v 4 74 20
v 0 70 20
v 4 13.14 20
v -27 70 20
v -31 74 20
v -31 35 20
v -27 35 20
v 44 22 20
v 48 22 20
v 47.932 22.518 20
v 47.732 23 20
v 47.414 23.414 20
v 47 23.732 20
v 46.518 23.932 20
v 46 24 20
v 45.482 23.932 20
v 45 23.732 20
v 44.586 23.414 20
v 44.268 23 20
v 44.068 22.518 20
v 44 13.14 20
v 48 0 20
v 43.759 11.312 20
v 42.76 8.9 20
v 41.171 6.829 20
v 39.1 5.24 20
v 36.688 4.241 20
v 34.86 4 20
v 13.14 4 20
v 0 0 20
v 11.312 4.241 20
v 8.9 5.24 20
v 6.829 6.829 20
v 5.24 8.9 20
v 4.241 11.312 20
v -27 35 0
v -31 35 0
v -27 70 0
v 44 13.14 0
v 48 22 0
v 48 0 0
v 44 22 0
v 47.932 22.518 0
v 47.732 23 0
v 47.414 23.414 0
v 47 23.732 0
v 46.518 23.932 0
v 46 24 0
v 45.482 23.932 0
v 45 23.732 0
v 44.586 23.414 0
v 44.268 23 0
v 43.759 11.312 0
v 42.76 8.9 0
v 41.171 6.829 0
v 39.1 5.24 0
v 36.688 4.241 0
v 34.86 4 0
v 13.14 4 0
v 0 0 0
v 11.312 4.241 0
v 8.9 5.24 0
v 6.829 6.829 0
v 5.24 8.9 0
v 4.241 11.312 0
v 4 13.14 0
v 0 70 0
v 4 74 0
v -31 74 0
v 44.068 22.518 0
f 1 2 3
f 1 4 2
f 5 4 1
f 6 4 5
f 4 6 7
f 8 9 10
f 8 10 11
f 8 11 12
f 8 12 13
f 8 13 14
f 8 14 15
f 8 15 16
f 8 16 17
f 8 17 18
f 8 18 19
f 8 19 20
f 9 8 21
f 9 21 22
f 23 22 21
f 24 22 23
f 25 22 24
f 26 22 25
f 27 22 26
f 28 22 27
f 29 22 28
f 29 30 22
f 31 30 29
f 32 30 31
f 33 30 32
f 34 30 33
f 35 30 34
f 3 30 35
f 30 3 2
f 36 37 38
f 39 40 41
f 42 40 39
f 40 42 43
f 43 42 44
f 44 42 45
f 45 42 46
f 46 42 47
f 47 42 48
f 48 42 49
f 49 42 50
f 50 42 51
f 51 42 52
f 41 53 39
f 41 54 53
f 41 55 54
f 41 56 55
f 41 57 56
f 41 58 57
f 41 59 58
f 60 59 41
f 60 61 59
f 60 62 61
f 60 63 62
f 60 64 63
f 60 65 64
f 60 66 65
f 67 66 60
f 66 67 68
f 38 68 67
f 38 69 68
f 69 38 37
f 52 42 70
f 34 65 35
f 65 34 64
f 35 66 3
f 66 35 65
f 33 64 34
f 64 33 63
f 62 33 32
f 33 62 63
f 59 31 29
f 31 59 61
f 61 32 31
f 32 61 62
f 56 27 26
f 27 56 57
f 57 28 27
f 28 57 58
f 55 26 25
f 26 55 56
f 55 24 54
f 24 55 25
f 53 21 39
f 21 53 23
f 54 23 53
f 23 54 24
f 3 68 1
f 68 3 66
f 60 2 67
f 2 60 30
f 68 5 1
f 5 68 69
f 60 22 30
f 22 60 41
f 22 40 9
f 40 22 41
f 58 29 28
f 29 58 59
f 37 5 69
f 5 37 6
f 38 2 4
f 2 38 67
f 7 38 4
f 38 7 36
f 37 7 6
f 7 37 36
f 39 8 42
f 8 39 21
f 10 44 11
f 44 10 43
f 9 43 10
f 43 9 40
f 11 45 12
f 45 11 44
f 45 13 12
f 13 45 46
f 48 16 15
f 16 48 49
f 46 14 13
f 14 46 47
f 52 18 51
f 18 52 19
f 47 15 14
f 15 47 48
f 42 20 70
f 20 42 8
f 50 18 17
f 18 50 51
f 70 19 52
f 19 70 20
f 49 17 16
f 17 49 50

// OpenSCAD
// Design of a hook for headphones to go over cubicle wall
wall_thickness = 4;  // How thick to make the part
cube_wall = 27;  // Width of the cubicle wall + a bit extra (about 1mm)
total_height = 70;  // Height of the hook from top to bottom
hook_height = 18;  // How far up the headphone holding hook (plus a bit more for rounded edge)
hook_length = 40; // Headset band is 24mm, give extra room
width = 20;  

rounding_size = hook_length / 4;  // Rounding of the top of the headphone hook

$fn = 24;

union() {
    // Main inside wall
    cube([wall_thickness, total_height + wall_thickness, width]);
    
    // Hook bottom
    cube([hook_length + (2*wall_thickness), wall_thickness, width]);
    
    // Top of cube wall
    translate([-(cube_wall + wall_thickness), total_height, 0]) {
        cube([cube_wall + (2*wall_thickness), wall_thickness, width]);
    };
    
    // Cube outside wall hook
    translate([-(cube_wall+wall_thickness), total_height/2, 0]) {
        cube([wall_thickness, total_height/2 + wall_thickness, width]);
    };
    
    // Hook for headset
    translate([hook_length + wall_thickness, 0, 0]) {
        cube([wall_thickness, hook_height+wall_thickness, width]);
    };
    
    // Inside rounding
    translate([wall_thickness + rounding_size -.1, wall_thickness + rounding_size -.1, 0]) {
        rounding(180);
    };
    
    // Outside rounding
    translate([hook_length - rounding_size + wall_thickness+.1, wall_thickness + rounding_size -.1, 0]) {
        rounding(270);
    };
    
    // Rounding of headset hook
    translate([hook_length + wall_thickness + (.5 * wall_thickness), hook_height + wall_thickness, width/2]) {
        cylinder(h=width, r=wall_thickness/2, center=true);
    };
};

module rounding(spin) {
    rotate(a=spin, v=[0, 0, 1]) {
        difference() {
            cube([rounding_size,rounding_size, width]);
            translate([0, 0, -width]) {
                cylinder(h=width*3, r=rounding_size);
            };
        };
    };
};    
